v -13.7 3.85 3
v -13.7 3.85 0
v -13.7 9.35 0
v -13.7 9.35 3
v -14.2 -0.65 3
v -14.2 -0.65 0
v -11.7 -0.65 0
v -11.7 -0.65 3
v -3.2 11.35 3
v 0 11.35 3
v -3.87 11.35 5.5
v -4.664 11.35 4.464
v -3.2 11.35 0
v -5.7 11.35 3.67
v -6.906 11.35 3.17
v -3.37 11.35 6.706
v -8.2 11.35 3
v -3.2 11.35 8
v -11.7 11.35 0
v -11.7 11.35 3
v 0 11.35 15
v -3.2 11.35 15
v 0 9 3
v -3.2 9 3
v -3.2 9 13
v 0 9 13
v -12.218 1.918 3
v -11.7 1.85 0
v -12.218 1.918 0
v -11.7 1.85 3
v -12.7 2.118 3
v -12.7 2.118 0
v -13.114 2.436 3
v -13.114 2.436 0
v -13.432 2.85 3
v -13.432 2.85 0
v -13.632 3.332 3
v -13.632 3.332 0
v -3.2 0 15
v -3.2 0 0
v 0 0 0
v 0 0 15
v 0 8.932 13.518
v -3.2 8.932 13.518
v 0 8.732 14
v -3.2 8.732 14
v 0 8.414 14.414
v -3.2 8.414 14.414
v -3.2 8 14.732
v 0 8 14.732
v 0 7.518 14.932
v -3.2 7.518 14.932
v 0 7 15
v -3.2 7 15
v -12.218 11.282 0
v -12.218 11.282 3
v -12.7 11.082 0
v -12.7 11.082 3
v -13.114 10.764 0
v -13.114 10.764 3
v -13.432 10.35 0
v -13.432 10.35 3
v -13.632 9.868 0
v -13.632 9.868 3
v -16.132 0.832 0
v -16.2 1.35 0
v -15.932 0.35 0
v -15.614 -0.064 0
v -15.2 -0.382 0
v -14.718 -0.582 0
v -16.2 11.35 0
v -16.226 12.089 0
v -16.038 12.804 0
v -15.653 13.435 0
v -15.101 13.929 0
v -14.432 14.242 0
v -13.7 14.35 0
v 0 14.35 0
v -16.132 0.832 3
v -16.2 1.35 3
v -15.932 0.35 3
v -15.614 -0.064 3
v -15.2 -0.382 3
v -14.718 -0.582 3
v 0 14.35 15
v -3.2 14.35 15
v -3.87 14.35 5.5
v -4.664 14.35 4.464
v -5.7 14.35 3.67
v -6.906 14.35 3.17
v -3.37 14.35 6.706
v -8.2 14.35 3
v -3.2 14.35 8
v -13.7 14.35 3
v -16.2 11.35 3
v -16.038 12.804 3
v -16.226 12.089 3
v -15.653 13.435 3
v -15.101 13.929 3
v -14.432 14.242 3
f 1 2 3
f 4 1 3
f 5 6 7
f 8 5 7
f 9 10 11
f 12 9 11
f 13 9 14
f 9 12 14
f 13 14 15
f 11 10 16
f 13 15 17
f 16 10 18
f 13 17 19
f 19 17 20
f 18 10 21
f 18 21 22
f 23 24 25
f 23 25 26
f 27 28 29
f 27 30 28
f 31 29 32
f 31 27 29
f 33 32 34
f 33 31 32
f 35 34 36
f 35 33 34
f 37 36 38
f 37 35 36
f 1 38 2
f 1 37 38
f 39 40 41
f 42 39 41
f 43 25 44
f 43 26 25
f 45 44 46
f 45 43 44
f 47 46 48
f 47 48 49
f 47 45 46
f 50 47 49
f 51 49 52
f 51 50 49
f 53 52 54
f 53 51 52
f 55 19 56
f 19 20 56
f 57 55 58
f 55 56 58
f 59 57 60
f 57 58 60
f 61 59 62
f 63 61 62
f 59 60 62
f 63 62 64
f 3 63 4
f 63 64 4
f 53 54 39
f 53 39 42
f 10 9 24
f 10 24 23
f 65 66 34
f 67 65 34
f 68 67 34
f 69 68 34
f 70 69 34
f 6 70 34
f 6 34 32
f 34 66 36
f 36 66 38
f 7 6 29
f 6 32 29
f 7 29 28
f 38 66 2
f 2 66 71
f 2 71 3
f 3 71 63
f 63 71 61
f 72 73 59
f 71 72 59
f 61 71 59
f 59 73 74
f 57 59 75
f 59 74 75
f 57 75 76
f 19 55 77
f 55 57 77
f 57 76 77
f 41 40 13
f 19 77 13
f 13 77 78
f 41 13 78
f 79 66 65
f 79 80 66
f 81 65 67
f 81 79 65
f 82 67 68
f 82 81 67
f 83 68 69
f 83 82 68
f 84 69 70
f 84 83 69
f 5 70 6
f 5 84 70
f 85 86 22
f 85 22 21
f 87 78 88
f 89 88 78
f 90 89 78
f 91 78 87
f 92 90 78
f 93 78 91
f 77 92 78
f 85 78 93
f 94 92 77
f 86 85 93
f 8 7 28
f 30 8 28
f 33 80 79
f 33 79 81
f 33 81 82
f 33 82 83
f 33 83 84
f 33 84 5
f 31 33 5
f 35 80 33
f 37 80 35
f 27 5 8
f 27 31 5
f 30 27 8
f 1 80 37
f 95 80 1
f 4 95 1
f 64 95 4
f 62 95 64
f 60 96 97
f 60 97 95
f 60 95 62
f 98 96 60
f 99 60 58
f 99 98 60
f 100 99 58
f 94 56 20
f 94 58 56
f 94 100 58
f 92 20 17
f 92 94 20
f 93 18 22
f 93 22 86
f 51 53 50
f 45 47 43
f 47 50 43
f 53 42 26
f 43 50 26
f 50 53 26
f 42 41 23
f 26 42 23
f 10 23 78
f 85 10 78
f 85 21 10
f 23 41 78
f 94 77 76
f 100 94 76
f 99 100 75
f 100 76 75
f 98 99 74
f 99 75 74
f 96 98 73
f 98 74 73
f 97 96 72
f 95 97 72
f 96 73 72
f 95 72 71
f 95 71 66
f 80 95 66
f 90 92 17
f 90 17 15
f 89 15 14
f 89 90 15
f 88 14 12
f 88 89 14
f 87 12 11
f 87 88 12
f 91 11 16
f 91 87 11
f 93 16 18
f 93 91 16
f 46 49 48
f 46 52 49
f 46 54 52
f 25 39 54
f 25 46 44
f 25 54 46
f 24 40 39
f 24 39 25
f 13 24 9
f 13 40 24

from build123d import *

# Parameters (mm, degrees)
F0_W        = 3.2
F0_H        = 9
F1_DEPTH    = 15
F0_H_2      = 3
F0_H_3      = 2.35
F2_DEPTH    = 3
F3_R        = 2
F4_R        = 1.99999
F5_T1_DEPTH = 3


# Not quite as in the source:
# - a fillet or chamfer that OpenCascade refuses, or shapes differently, is made with other operations: its cross-section is extruded or revolved along the edge and cut away or added
# - a fillet or chamfer is up to 0.001 mm smaller than in the source, because OpenCascade refuses the exact size


with BuildPart() as f1:
    # F0 (on Top) → F1 (new body)
    with BuildSketch(Plane.XY):
        with Locations((-1.6, 4.5)):
            Rectangle(F0_W, F0_H)
    extrude(amount=F1_DEPTH)



with BuildPart() as f1b:
    # F0 (on Top) → F1, piece 2 (new body)
    with BuildSketch(Plane.XY):
        with Locations((-1.6, 12.85)):
            Rectangle(F0_W, F0_H_2)
    extrude(amount=F1_DEPTH)


with BuildPart() as f1_1:
    add(f1.part)

    add(f1b.part)  # F2 merges F1b
    # F0 (on Top) → F2 (join)
    with BuildSketch(Plane.XY):
        with Locations((-1.6, 10.175)):
            Rectangle(F0_W, F0_H_3)
        with BuildLine():
            Line((-13.7, 11.35), (-3.2, 11.35))
            Line((-3.2, 11.35), (-3.2, 14.35))
            Line((-3.2, 14.35), (-13.7, 14.35))
            ThreePointArc((-13.7, 14.35), (-15.652562419, 13.4354686825), (-16.2, 11.35))
            Line((-16.2, 11.35), (-16.2, -0.65))
            Line((-16.2, -0.65), (-13.7, -0.65))
            Line((-13.7, -0.65), (-11.7, -0.65))
            Line((-11.7, -0.65), (-11.7, 1.85))
            Line((-11.7, 1.85), (-13.7, 1.85))
            Line((-13.7, 1.85), (-13.7, 11.35))
        make_face()
    extrude(amount=F2_DEPTH)

    # F3
    f3_edges = [f1_1.edges().sort_by_distance(p)[0] for p in [
        (-1.6, 9, 15),
    ]]
    fillet(f3_edges, radius=F3_R)

    # F4 (radius 2 in the source; OpenCascade refuses exactly that, so slightly less here)
    f4_edges = [f1_1.edges().sort_by_distance(p)[0] for p in [
        (-16.2, -0.65, 1.5),
        (-13.7, 11.35, 1.5),
        (-13.7, 1.85, 1.5),
    ]]
    fillet(f4_edges, radius=F4_R)

    # F5: fillet of radius 5 on 1 edges, made by hand

    # F5_s2 → F5_t1 (join)
    with BuildSketch(Plane.XZ.offset(-14.35)):
        with BuildLine():
            ThreePointArc((-8.2, 3), (-4.6644660941, 4.4644660941), (-3.2, 8))
            Line((-3.2, 8), (-3.2, 3))
            Line((-3.2, 3), (-8.2, 3))
        make_face()
    extrude(amount=F5_T1_DEPTH)


solid = f1_1.part
